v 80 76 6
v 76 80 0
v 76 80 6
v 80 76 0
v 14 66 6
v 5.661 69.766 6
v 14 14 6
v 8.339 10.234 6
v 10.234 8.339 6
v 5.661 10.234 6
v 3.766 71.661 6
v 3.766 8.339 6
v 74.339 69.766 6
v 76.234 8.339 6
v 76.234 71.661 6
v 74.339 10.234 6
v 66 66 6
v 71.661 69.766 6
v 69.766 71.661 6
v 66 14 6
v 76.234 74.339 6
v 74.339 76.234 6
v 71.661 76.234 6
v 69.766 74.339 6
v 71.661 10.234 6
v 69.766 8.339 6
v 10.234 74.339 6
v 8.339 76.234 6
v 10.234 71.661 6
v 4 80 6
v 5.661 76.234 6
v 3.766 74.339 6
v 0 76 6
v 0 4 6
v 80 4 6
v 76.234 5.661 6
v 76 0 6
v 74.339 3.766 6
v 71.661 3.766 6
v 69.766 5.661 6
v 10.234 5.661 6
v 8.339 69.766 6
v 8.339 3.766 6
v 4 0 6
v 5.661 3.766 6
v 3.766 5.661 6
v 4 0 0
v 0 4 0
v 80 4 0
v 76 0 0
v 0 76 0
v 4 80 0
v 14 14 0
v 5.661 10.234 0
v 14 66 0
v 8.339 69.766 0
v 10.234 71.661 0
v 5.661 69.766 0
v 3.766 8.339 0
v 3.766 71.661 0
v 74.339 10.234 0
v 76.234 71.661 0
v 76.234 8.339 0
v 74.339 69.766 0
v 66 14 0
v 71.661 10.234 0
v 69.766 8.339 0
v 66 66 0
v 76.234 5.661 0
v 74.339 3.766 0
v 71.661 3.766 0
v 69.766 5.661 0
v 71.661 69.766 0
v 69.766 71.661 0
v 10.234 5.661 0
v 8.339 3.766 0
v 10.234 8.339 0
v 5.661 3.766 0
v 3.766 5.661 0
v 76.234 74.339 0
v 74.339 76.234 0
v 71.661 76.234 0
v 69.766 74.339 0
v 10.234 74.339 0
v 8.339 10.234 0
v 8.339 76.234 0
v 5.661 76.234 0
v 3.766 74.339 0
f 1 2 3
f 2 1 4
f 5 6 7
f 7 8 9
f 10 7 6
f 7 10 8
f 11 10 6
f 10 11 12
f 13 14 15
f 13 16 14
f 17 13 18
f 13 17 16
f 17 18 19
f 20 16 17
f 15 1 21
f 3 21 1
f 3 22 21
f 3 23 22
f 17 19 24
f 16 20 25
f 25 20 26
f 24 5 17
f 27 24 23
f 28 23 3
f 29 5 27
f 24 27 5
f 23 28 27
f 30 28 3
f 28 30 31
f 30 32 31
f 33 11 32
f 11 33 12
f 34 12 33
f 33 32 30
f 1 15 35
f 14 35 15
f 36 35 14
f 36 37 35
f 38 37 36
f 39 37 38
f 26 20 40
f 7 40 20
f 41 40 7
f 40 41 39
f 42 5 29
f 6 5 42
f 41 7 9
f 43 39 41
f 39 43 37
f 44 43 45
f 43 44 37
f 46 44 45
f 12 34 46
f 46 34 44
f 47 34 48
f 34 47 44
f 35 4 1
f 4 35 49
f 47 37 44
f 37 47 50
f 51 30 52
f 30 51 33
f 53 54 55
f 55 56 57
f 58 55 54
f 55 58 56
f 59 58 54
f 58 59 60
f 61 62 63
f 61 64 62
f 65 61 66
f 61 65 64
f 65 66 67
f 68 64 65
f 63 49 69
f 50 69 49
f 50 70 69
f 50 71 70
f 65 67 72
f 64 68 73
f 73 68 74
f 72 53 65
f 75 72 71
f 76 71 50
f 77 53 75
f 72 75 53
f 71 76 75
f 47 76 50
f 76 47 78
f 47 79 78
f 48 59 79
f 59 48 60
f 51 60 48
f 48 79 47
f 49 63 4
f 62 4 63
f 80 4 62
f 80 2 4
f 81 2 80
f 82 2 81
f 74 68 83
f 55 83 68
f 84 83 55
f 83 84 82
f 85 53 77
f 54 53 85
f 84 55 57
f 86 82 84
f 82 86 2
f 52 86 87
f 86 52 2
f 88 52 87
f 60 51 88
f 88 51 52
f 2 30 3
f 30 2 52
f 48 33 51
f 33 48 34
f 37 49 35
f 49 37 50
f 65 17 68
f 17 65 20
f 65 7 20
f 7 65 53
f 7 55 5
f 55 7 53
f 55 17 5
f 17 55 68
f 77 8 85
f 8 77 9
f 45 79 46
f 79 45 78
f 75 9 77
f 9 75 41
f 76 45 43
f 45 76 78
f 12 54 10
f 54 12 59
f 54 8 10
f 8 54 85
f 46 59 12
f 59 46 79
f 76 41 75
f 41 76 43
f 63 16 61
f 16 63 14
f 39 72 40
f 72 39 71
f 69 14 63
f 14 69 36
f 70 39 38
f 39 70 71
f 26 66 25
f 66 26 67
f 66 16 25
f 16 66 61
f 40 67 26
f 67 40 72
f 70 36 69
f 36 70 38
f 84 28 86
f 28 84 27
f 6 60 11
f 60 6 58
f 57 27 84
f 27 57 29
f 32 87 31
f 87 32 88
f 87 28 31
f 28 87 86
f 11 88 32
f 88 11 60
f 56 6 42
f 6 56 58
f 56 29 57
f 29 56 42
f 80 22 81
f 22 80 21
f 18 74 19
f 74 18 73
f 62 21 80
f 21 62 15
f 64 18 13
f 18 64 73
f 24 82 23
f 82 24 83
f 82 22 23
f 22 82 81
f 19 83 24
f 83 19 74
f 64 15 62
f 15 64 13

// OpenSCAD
$fn = 32;

// ----------------------------------------------------------------------
// Frame plate: 80 x 80 frame, 14 mm rails
// ----------------------------------------------------------------------

// --- parameters (mm) ---
plate_l = 80;             // plate length, X
plate_w = 80;             // plate width, Y
plate_t = 6;              // plate thickness, Z (extrusion height)
corner_c = 4;             // corner chamfer
frame_bar = 14;           // frame rail width
bolt_r = 3.5;             // corner bolt window radius
bolt_inset = 7;           // bolt centre inset from the edges

win_l = plate_l - 2 * frame_bar;  // window length
win_w = plate_w - 2 * frame_bar;  // window width
bolt_d = 2 * bolt_r;  // corner hole diameter

profile = [[4, 0], [76, 0], [80, 4], [80, 76], [76, 80], [4, 80], [0, 76], [0, 4]];  // primary outline, 8 points, counter clockwise
void_1 = [[14, 14], [66, 14], [66, 66], [14, 66]];  // the window, 4 points
void_2 = [[10.234, 8.339], [8.339, 10.234], [5.661, 10.234], [3.766, 8.339], [3.766, 5.661], [5.661, 3.766], [8.339, 3.766], [10.234, 5.661]];  // corner bolt window, 8 points
void_3 = [[76.234, 8.339], [74.339, 10.234], [71.661, 10.234], [69.766, 8.339], [69.766, 5.661], [71.661, 3.766], [74.339, 3.766], [76.234, 5.661]];  // corner bolt window, 8 points
void_4 = [[10.234, 74.339], [8.339, 76.234], [5.661, 76.234], [3.766, 74.339], [3.766, 71.661], [5.661, 69.766], [8.339, 69.766], [10.234, 71.661]];  // corner bolt window, 8 points
void_5 = [[76.234, 74.339], [74.339, 76.234], [71.661, 76.234], [69.766, 74.339], [69.766, 71.661], [71.661, 69.766], [74.339, 69.766], [76.234, 71.661]];  // corner bolt window, 8 points

// --- the one profile operation ---
difference() {
  linear_extrude(height = plate_t) polygon(points = profile);
  translate([0, 0, -1])
    linear_extrude(height = plate_t + 2) polygon(points = void_1);
  translate([0, 0, -1])
    linear_extrude(height = plate_t + 2) polygon(points = void_2);
  translate([0, 0, -1])
    linear_extrude(height = plate_t + 2) polygon(points = void_3);
  translate([0, 0, -1])
    linear_extrude(height = plate_t + 2) polygon(points = void_4);
  translate([0, 0, -1])
    linear_extrude(height = plate_t + 2) polygon(points = void_5);
}
